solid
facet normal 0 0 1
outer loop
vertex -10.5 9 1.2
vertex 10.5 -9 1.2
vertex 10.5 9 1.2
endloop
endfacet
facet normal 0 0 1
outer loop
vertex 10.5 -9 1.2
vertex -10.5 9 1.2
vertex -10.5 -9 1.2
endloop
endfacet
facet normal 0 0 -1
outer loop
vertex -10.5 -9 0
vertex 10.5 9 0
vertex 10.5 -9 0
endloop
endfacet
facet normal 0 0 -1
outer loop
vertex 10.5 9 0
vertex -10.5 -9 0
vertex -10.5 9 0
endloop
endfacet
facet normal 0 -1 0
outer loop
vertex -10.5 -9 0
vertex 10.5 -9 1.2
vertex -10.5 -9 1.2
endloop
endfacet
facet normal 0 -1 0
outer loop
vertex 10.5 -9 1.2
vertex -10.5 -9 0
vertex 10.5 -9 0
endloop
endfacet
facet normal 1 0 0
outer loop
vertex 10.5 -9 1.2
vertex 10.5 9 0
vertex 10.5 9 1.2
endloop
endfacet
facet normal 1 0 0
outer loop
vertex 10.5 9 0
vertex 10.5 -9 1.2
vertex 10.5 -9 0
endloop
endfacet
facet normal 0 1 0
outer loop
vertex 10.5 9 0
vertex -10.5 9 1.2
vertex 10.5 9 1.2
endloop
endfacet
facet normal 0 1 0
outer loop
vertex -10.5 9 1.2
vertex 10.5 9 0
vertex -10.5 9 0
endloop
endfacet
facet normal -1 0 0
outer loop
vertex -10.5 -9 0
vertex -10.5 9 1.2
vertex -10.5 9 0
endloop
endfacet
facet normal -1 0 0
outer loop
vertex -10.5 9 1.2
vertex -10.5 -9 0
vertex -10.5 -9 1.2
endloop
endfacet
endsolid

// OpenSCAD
// PCB: 21.0mm x 18.0mm x 1.2mm
// One connected solid (board outline only)

$fn = 64;

pcb_L = 21.0;
pcb_W = 18.0;
pcb_T = 1.2;

color([0.0, 0.4, 0.2])
translate([0, 0, pcb_T/2])   // place on Z=0 plane for reliable viewing
    cube([pcb_L, pcb_W, pcb_T], center=true);
